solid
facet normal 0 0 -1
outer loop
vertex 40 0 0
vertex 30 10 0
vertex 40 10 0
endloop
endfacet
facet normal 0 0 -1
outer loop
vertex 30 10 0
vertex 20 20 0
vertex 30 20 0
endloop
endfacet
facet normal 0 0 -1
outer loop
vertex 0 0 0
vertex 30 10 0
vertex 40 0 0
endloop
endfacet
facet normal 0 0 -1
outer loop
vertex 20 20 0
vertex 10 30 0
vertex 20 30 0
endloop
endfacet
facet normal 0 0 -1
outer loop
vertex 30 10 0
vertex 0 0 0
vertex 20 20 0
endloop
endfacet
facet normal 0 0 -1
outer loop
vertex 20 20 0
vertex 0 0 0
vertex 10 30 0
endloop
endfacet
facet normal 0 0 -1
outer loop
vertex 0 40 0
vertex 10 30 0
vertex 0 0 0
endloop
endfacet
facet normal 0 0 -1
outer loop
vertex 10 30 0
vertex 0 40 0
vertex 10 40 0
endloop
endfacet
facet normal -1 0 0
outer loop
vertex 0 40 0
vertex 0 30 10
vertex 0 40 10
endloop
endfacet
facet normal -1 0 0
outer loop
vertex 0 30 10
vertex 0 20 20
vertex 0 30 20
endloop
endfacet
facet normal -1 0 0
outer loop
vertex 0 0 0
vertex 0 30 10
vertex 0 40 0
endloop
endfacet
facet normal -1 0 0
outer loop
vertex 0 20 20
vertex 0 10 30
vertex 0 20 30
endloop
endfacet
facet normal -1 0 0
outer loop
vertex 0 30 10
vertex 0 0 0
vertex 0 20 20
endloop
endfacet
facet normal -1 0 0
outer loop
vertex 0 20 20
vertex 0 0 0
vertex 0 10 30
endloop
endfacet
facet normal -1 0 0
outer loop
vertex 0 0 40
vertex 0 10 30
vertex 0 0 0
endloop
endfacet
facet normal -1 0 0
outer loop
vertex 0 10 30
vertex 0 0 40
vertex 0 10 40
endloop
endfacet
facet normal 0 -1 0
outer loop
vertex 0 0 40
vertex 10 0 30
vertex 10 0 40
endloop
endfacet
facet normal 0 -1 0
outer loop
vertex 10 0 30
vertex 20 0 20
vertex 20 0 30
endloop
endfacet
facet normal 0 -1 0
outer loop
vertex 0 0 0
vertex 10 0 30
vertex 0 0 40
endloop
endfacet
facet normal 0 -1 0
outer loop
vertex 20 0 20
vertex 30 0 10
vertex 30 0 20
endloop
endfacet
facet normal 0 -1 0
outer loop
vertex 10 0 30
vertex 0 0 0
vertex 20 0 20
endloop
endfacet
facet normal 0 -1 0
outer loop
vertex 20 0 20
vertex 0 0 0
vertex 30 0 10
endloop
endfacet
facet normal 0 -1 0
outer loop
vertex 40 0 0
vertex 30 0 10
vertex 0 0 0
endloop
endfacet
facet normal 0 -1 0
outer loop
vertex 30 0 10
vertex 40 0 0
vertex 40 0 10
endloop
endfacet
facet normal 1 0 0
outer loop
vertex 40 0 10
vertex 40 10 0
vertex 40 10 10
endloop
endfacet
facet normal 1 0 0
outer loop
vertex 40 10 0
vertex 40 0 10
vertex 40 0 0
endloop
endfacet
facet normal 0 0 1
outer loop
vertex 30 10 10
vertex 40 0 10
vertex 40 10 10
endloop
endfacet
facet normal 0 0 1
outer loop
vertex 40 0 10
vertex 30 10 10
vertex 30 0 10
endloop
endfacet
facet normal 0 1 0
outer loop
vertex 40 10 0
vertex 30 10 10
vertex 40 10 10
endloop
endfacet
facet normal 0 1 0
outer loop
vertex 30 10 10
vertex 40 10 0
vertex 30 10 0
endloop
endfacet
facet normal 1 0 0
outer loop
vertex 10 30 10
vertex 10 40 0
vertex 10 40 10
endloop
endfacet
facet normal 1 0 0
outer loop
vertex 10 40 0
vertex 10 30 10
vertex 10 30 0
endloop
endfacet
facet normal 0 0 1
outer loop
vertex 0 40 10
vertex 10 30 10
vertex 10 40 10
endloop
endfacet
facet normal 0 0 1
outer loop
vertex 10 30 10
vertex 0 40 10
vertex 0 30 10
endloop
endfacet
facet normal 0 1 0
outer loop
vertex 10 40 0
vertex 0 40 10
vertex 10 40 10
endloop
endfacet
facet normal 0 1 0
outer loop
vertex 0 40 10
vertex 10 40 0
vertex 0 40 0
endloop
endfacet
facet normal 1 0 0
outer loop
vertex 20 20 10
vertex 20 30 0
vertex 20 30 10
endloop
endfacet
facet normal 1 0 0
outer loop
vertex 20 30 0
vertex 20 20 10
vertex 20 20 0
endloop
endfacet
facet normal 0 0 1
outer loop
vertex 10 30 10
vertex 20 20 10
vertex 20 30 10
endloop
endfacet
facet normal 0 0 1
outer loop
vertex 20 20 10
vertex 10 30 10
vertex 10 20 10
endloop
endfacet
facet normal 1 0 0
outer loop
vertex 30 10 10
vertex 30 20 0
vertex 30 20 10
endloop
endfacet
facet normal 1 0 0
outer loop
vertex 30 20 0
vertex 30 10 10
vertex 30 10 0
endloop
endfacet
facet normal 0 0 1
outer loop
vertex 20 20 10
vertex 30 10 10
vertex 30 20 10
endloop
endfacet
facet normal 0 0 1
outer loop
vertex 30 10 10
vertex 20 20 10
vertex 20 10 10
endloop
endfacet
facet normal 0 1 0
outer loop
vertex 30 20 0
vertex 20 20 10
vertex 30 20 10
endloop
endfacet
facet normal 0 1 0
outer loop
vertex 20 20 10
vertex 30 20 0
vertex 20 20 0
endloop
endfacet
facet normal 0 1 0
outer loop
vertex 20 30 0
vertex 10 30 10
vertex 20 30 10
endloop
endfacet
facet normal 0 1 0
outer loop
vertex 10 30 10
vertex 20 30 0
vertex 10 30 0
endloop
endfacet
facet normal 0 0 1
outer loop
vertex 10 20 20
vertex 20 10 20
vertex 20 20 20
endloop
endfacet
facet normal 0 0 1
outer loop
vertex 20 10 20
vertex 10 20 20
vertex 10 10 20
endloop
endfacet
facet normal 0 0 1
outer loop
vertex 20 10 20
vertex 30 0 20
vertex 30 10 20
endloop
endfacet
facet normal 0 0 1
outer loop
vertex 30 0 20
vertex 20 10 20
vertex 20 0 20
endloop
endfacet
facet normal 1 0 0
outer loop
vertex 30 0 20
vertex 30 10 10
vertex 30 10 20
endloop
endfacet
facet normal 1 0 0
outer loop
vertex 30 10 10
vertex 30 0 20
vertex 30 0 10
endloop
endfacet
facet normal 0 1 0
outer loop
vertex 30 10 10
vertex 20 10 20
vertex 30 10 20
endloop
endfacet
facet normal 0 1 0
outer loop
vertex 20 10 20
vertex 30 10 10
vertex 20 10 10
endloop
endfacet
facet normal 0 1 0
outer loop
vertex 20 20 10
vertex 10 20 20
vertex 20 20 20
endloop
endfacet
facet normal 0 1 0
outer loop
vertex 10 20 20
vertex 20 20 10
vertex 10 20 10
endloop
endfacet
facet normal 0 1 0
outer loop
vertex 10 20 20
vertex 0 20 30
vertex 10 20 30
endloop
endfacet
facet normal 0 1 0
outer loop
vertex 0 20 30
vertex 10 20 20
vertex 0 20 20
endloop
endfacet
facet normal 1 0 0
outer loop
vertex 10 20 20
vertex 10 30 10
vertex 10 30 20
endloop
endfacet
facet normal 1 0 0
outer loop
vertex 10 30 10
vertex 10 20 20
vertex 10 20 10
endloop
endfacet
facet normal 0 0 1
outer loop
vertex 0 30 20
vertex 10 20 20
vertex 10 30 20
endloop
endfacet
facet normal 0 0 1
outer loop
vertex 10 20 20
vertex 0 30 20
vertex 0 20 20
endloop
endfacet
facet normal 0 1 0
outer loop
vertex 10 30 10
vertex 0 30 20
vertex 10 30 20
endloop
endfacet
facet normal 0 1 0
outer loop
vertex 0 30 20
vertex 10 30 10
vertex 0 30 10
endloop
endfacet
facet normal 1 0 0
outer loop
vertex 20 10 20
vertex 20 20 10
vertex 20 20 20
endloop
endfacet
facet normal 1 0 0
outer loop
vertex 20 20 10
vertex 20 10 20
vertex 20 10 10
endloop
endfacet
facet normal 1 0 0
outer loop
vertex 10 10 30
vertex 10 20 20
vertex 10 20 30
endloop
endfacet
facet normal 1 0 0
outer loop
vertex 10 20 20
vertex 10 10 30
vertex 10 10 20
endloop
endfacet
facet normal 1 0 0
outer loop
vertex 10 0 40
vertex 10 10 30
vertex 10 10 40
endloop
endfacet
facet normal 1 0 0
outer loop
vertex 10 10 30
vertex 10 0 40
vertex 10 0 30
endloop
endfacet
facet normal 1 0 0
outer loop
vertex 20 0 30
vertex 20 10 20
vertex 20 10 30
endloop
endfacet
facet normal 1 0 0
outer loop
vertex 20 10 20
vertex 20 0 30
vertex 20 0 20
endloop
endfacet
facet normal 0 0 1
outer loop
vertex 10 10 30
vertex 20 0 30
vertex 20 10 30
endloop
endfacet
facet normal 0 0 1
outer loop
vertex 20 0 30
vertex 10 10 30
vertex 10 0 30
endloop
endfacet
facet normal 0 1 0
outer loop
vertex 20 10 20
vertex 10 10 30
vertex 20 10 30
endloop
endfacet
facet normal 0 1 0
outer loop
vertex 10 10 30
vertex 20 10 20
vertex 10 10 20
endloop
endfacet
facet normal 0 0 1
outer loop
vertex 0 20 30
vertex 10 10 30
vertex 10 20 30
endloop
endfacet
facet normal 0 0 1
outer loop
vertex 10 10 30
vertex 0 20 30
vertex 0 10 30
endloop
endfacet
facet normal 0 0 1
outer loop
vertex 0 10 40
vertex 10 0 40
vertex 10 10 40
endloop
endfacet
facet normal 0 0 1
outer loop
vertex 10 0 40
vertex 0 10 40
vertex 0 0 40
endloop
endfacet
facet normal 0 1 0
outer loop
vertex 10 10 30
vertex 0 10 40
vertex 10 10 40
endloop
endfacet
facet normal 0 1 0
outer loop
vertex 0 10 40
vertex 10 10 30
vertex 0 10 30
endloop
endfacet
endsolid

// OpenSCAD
union() {
  translate([0, 0, 0])  cube(10);
  translate([10, 0, 0]) cube(10);
  translate([20, 0, 0]) cube(10);
  translate([30, 0, 0]) cube(10);
  translate([0, 10, 0]) cube(10);
  translate([0, 20, 0]) cube(10);
  translate([0, 30, 0]) cube(10);
  translate([10, 10, 0]) cube(10);
  translate([20, 10, 0]) cube(10);
  translate([10, 20, 0]) cube(10);
  
  translate([0, 0, 10])  cube(10);
  translate([10, 0, 10]) cube(10);
  translate([20, 0, 10]) cube(10);
  translate([0, 10, 10]) cube(10);
  translate([0, 20, 10]) cube(10);
  translate([10, 10, 10]) cube(10);
  
  translate([0, 0, 20])  cube(10);
  translate([10, 0, 20]) cube(10);
  translate([0, 10, 20]) cube(10);

  translate([0, 0, 30])  cube(10);
}
